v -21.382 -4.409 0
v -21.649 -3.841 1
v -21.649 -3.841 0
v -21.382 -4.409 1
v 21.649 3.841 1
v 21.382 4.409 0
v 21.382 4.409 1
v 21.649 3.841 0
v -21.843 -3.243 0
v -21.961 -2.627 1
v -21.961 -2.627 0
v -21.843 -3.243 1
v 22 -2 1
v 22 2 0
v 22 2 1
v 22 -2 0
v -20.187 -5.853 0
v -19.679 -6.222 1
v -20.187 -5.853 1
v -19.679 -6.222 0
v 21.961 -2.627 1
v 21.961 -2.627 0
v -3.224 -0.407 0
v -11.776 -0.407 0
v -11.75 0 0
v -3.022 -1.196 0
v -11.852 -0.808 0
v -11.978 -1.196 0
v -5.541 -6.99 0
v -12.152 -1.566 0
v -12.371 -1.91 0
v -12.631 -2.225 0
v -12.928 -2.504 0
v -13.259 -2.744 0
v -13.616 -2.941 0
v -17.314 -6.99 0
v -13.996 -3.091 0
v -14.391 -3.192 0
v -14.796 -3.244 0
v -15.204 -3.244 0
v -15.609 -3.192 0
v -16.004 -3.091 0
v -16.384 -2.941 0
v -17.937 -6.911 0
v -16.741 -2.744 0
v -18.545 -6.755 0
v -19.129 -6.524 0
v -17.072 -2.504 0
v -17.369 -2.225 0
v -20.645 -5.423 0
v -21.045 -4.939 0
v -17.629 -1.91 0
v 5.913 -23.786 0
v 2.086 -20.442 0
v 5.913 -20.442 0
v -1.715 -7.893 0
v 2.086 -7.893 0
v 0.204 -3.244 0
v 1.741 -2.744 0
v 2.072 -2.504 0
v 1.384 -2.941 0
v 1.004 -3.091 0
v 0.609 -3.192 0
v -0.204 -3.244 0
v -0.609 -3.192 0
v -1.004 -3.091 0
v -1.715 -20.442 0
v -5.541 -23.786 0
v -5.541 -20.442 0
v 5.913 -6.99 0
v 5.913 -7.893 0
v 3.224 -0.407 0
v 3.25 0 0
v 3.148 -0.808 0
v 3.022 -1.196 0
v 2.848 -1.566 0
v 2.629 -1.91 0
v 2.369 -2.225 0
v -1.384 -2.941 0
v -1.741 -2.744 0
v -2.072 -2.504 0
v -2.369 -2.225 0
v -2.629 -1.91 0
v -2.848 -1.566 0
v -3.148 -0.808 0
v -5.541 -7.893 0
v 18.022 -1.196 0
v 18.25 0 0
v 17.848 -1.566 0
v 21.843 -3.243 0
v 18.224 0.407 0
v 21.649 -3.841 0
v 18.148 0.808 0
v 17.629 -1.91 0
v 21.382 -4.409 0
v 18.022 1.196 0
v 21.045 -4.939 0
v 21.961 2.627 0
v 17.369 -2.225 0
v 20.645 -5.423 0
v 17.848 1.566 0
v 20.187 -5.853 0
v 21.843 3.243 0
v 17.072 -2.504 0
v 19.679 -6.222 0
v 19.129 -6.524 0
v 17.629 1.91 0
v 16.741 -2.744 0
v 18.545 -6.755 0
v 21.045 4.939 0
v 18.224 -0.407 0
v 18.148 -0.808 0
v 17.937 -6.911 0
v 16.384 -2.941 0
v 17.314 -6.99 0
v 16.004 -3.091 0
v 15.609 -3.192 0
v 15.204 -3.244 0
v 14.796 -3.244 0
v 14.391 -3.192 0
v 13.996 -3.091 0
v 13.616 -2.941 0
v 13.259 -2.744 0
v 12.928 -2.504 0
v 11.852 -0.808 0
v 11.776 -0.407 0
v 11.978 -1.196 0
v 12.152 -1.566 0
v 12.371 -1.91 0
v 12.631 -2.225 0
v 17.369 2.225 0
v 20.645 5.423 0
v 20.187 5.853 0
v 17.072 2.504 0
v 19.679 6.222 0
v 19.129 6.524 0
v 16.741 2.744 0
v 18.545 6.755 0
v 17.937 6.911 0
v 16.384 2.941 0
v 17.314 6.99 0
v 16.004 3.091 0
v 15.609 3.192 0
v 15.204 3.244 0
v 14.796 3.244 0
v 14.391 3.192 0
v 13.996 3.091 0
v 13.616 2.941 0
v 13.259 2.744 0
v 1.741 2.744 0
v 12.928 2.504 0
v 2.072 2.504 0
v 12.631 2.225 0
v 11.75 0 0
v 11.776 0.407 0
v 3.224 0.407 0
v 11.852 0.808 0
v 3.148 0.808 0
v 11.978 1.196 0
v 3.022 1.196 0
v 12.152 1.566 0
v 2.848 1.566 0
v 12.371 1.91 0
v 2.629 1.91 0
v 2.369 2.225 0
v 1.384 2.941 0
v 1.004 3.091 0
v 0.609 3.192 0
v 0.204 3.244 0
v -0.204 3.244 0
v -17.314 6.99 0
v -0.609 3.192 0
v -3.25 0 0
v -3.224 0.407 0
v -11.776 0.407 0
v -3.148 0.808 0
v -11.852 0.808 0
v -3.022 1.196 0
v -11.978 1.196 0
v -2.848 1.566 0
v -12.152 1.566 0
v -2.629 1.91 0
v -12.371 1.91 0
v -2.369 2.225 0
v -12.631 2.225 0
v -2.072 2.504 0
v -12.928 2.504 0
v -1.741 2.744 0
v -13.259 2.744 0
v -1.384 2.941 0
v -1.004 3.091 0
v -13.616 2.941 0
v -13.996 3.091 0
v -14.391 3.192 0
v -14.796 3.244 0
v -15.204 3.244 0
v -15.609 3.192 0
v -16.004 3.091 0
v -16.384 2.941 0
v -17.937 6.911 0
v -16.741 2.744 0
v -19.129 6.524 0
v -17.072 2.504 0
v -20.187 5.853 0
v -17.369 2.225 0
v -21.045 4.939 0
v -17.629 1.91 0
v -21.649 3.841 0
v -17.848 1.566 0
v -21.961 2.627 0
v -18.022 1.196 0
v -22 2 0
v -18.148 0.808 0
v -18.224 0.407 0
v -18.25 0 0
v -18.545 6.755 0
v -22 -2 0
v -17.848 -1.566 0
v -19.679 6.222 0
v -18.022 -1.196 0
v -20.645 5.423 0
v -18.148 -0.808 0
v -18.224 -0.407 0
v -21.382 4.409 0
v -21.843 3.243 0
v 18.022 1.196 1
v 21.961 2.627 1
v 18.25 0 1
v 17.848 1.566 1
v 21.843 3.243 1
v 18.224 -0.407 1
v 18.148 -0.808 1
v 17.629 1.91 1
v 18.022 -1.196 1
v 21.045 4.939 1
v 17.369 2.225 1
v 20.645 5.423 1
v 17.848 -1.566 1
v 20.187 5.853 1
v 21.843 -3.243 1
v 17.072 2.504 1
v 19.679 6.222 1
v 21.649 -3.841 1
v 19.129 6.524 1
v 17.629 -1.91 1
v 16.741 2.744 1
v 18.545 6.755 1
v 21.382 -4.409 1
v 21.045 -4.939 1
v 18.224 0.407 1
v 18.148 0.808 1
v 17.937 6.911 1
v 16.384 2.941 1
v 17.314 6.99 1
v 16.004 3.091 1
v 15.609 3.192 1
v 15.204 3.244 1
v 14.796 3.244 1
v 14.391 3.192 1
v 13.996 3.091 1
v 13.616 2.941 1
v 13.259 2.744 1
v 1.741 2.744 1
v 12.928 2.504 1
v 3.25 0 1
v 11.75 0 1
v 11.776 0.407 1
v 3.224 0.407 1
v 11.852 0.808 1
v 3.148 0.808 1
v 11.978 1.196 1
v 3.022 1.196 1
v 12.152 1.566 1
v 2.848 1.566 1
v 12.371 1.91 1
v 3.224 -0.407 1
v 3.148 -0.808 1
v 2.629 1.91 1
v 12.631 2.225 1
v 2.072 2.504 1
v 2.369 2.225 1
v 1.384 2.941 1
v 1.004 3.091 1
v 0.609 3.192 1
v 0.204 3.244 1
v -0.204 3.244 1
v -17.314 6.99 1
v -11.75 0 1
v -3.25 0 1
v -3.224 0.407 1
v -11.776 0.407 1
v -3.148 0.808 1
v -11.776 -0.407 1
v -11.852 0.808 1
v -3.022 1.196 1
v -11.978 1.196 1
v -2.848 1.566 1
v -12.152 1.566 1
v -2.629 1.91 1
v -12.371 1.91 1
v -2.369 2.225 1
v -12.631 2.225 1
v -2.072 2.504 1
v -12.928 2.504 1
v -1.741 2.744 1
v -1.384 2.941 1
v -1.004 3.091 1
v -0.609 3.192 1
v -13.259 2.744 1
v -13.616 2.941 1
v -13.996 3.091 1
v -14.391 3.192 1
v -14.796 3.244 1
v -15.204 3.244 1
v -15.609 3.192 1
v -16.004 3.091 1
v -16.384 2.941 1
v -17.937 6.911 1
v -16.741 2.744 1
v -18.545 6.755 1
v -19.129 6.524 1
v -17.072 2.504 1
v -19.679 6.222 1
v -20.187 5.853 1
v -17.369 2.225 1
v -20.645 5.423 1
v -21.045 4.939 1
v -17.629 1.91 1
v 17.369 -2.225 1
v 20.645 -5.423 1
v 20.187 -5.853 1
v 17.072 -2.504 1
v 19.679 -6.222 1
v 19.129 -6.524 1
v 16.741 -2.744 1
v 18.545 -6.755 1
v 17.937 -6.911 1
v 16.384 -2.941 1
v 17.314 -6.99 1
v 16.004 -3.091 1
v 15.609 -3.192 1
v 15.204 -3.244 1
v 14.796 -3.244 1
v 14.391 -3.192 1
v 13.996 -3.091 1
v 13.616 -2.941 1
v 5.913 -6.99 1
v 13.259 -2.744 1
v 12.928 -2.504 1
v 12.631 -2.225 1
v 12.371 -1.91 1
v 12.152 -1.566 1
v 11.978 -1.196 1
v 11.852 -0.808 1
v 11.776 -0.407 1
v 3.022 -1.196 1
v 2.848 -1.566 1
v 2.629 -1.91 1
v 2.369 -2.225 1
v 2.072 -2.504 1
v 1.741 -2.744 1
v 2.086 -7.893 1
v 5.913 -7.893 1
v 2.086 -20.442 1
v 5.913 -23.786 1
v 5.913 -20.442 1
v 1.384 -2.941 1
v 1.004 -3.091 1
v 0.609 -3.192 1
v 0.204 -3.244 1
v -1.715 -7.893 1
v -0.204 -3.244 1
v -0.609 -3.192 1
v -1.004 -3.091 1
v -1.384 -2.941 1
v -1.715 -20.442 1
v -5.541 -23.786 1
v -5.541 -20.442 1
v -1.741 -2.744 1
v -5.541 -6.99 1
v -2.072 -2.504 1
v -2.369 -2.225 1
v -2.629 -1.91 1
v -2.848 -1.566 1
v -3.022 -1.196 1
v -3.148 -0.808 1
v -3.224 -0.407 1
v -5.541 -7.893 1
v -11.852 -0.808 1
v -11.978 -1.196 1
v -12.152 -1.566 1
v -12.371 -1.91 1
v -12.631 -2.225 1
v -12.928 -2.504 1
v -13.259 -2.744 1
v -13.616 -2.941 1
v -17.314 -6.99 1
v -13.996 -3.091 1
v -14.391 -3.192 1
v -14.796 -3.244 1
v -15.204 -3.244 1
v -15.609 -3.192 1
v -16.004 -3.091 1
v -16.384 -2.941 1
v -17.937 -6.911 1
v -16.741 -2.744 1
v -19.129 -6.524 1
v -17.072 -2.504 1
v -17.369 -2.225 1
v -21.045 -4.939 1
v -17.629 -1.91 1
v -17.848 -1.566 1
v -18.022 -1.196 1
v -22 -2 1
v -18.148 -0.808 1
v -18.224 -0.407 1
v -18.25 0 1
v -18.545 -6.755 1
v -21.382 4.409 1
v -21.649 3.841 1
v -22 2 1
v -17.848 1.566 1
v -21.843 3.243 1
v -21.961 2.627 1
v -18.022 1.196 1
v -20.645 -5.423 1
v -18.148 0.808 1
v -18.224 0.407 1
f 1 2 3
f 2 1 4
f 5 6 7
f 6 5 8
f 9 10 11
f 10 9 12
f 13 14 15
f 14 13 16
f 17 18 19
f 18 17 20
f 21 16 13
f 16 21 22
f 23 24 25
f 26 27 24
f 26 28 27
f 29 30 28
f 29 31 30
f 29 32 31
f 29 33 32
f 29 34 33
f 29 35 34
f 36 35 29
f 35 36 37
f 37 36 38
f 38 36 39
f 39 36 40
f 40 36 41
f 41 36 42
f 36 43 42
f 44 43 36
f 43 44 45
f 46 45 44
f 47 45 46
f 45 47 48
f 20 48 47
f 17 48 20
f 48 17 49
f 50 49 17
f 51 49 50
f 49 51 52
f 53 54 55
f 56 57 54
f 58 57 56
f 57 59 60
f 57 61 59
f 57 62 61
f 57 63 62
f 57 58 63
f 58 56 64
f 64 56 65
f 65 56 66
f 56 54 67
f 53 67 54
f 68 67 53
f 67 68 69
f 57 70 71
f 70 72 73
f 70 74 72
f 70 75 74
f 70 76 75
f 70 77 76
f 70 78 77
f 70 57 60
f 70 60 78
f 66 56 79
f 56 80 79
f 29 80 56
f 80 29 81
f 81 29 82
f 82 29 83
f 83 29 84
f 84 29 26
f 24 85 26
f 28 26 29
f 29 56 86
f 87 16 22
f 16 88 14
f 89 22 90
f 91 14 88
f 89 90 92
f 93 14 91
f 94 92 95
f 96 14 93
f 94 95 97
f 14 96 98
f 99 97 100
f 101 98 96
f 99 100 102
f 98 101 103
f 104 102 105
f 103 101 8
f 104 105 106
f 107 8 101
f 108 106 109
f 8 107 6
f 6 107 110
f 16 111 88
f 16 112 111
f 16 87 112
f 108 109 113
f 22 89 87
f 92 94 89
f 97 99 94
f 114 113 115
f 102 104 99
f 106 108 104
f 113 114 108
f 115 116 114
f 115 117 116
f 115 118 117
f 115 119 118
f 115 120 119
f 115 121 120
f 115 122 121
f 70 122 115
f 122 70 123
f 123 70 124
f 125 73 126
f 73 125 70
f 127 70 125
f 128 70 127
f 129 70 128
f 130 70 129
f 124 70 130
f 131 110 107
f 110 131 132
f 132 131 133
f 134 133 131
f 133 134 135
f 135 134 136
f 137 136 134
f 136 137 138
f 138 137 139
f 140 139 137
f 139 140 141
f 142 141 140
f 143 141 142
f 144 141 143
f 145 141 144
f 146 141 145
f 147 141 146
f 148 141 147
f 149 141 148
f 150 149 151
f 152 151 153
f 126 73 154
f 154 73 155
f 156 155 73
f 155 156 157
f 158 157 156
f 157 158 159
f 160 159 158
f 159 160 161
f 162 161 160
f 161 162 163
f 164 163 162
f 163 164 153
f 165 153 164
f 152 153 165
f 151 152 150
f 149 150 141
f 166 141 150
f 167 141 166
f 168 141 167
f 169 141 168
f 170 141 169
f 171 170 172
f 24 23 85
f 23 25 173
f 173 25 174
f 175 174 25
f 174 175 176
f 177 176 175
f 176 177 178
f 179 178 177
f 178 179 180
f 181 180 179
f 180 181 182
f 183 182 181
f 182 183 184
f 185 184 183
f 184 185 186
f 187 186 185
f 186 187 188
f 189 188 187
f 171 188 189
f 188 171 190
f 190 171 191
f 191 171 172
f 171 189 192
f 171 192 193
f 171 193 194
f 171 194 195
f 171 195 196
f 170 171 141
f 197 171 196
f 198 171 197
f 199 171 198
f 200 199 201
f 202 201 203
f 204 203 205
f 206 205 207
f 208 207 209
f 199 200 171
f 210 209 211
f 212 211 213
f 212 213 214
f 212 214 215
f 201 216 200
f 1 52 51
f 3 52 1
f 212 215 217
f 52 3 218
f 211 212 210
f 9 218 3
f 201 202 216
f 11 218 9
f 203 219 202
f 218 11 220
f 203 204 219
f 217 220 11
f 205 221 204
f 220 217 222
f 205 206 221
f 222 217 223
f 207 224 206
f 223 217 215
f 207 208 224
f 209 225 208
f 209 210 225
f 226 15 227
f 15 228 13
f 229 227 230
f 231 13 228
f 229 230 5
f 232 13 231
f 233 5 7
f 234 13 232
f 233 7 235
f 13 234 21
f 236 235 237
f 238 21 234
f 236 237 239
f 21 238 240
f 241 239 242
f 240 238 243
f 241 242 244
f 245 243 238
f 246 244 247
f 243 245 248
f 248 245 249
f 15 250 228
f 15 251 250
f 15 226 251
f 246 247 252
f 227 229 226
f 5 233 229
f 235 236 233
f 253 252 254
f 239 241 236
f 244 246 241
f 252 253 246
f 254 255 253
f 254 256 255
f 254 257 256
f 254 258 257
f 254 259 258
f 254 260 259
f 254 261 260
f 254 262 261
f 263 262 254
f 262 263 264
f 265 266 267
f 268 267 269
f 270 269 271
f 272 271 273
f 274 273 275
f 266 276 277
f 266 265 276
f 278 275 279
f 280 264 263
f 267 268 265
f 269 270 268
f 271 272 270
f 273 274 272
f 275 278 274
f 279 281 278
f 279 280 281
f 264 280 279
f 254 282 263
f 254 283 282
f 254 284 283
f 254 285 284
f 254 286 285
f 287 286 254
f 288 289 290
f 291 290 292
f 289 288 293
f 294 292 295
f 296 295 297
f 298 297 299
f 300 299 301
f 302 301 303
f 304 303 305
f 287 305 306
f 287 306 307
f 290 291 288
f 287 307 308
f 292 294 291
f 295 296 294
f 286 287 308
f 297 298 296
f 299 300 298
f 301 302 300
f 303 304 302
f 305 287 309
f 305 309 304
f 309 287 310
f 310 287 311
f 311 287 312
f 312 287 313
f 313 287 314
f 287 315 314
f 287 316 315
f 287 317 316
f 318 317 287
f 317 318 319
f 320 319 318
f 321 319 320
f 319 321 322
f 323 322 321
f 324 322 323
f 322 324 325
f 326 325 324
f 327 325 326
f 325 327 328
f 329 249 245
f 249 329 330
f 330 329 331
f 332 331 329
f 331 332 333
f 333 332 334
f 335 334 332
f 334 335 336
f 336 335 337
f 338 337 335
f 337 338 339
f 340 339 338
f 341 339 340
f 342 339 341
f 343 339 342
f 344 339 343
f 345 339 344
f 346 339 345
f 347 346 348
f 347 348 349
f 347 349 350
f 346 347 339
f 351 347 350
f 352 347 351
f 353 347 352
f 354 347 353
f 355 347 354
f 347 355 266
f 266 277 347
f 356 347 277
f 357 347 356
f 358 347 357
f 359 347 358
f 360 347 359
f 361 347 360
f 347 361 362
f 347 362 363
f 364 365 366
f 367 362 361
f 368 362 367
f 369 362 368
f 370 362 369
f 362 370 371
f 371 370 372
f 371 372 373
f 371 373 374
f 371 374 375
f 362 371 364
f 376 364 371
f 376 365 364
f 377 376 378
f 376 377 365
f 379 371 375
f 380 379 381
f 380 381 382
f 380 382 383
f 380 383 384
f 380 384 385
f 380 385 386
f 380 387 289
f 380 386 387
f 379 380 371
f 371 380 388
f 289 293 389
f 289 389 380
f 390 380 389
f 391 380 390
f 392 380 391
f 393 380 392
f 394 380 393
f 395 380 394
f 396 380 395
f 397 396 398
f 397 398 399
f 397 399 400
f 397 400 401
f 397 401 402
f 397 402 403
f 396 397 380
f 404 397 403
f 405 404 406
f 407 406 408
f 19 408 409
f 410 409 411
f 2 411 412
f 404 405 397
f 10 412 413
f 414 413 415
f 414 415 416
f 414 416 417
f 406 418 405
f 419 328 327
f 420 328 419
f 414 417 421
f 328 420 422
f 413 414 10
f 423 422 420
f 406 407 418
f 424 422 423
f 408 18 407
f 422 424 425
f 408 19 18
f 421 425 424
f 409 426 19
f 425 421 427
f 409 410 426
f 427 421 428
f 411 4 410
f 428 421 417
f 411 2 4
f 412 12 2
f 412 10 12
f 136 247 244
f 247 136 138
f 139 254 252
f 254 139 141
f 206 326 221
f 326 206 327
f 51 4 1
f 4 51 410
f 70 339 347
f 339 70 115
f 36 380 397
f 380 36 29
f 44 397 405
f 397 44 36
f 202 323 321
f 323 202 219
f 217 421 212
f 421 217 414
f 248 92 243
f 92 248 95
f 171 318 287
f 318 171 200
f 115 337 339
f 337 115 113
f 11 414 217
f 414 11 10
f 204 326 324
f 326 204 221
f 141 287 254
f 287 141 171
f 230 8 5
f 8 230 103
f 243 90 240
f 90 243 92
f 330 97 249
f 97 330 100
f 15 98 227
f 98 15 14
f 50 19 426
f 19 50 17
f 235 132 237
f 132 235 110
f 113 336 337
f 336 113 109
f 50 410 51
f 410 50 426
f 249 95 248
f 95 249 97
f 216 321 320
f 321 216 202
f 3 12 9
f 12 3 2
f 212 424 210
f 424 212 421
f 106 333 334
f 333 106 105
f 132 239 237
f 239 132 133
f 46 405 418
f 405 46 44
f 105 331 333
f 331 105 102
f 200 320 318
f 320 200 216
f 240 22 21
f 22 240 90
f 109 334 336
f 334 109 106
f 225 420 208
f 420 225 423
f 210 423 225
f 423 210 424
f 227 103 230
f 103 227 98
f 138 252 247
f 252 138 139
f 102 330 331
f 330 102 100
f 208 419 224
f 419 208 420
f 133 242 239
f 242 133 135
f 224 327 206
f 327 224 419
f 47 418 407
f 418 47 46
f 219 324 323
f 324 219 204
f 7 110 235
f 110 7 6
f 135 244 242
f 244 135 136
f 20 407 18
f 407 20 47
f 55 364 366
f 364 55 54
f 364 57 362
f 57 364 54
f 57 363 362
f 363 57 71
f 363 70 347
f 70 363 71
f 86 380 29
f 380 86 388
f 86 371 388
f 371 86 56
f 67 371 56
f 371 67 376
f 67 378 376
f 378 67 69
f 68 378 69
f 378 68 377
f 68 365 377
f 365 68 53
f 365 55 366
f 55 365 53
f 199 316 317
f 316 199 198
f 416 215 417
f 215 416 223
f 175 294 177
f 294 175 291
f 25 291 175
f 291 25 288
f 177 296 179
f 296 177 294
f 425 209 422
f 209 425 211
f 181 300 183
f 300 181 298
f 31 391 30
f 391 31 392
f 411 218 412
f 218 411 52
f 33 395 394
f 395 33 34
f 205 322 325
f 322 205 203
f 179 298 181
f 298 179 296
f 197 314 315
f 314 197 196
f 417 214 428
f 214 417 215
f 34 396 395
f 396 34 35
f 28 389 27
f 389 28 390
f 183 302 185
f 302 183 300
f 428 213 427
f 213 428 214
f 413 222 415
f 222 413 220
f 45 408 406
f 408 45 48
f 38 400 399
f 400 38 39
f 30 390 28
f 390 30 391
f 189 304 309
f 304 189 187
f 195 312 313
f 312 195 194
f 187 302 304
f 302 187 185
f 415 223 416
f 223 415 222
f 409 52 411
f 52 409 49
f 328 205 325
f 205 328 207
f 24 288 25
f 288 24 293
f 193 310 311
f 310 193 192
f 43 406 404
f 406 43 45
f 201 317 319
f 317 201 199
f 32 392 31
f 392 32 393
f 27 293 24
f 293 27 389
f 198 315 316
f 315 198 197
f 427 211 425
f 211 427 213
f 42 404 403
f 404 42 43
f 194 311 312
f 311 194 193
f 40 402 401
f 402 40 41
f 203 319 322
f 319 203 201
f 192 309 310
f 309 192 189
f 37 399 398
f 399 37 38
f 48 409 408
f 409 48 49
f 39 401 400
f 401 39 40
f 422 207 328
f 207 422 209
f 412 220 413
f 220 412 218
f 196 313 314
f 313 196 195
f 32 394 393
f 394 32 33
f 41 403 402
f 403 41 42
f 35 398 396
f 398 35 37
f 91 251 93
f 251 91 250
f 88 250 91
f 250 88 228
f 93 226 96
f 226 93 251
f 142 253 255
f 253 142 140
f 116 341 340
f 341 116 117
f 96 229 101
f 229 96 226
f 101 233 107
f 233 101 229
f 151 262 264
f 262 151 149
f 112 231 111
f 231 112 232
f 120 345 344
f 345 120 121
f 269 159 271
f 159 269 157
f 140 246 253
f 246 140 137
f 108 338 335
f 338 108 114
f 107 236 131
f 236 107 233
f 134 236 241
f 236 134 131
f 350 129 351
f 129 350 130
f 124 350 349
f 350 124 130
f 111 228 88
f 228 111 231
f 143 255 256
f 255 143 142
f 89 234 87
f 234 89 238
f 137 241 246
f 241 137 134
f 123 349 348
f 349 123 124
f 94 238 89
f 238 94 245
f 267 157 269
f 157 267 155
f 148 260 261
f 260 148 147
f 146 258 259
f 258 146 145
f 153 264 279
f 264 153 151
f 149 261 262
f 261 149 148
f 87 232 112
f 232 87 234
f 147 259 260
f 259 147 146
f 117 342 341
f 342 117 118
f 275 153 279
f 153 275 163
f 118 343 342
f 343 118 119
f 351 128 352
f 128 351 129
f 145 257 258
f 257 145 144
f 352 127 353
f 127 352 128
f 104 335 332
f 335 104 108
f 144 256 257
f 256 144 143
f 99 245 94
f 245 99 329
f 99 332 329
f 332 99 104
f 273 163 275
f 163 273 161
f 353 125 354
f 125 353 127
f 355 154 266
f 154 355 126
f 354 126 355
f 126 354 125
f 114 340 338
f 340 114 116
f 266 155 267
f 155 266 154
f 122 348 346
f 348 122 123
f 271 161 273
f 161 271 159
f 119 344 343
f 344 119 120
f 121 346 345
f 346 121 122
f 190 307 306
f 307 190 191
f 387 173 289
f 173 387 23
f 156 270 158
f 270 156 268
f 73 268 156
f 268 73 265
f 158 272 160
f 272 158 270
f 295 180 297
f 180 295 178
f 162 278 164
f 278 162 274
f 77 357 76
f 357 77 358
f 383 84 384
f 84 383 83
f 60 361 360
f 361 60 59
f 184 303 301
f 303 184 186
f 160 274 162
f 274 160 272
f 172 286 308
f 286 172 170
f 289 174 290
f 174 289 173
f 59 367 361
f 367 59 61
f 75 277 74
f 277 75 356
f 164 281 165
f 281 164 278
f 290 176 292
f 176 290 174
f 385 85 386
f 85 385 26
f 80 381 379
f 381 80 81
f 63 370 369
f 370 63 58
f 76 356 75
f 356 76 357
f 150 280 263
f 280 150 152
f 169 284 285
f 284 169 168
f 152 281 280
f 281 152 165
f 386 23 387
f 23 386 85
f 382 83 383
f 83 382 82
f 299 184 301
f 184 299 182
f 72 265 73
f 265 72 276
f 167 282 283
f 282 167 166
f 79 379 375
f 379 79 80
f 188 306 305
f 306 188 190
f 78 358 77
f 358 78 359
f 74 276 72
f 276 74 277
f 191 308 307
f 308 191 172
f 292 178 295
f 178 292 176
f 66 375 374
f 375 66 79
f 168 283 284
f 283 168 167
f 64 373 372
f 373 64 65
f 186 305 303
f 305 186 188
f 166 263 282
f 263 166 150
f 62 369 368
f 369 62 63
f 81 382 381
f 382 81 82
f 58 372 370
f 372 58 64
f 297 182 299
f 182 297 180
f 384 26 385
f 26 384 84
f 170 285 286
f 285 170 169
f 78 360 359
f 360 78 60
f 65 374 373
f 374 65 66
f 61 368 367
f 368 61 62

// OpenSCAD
$fn = 50;


difference() {
	union() {
		translate(v = [0, 0, 0]) {
			rotate(a = [0, 0, 0]) {
				hull() {
					translate(v = [-17.0000000000, 2.0000000000, 0]) {
						rotate(a = [0, 0, 0]) {
							translate(v = [0, 0, 0]) {
								rotate(a = [0, 0, 0]) {
									cylinder(h = 1, r = 5);
								}
							}
						}
					}
					translate(v = [17.0000000000, 2.0000000000, 0]) {
						rotate(a = [0, 0, 0]) {
							translate(v = [0, 0, 0]) {
								rotate(a = [0, 0, 0]) {
									cylinder(h = 1, r = 5);
								}
							}
						}
					}
					translate(v = [-17.0000000000, -2.0000000000, 0]) {
						rotate(a = [0, 0, 0]) {
							translate(v = [0, 0, 0]) {
								rotate(a = [0, 0, 0]) {
									cylinder(h = 1, r = 5);
								}
							}
						}
					}
					translate(v = [17.0000000000, -2.0000000000, 0]) {
						rotate(a = [0, 0, 0]) {
							translate(v = [0, 0, 0]) {
								rotate(a = [0, 0, 0]) {
									cylinder(h = 1, r = 5);
								}
							}
						}
					}
				}
			}
		}
		translate(v = [0, -5, 0]) {
			rotate(a = [0, 0, 0]) {
				linear_extrude(height = 1) {
					text(font = "DejaVu Sans Mono:style=Bold", halign = "center", size = 19.0000000000, text = "I", valign = "top");
				}
			}
		}
	}
	union() {
		translate(v = [-15.0000000000, 0.0000000000, -125.0000000000]) {
			rotate(a = [0, 0, 0]) {
				cylinder(h = 250, r = 3.2500000000);
			}
		}
		translate(v = [15.0000000000, 0.0000000000, -125.0000000000]) {
			rotate(a = [0, 0, 0]) {
				cylinder(h = 250, r = 3.2500000000);
			}
		}
		translate(v = [15.0000000000, 0.0000000000, -125.0000000000]) {
			rotate(a = [0, 0, 0]) {
				cylinder(h = 250, r = 3.2500000000);
			}
		}
		translate(v = [0, 0, -125.0000000000]) {
			rotate(a = [0, 0, 0]) {
				cylinder(h = 250, r = 3.2500000000);
			}
		}
	}
}
